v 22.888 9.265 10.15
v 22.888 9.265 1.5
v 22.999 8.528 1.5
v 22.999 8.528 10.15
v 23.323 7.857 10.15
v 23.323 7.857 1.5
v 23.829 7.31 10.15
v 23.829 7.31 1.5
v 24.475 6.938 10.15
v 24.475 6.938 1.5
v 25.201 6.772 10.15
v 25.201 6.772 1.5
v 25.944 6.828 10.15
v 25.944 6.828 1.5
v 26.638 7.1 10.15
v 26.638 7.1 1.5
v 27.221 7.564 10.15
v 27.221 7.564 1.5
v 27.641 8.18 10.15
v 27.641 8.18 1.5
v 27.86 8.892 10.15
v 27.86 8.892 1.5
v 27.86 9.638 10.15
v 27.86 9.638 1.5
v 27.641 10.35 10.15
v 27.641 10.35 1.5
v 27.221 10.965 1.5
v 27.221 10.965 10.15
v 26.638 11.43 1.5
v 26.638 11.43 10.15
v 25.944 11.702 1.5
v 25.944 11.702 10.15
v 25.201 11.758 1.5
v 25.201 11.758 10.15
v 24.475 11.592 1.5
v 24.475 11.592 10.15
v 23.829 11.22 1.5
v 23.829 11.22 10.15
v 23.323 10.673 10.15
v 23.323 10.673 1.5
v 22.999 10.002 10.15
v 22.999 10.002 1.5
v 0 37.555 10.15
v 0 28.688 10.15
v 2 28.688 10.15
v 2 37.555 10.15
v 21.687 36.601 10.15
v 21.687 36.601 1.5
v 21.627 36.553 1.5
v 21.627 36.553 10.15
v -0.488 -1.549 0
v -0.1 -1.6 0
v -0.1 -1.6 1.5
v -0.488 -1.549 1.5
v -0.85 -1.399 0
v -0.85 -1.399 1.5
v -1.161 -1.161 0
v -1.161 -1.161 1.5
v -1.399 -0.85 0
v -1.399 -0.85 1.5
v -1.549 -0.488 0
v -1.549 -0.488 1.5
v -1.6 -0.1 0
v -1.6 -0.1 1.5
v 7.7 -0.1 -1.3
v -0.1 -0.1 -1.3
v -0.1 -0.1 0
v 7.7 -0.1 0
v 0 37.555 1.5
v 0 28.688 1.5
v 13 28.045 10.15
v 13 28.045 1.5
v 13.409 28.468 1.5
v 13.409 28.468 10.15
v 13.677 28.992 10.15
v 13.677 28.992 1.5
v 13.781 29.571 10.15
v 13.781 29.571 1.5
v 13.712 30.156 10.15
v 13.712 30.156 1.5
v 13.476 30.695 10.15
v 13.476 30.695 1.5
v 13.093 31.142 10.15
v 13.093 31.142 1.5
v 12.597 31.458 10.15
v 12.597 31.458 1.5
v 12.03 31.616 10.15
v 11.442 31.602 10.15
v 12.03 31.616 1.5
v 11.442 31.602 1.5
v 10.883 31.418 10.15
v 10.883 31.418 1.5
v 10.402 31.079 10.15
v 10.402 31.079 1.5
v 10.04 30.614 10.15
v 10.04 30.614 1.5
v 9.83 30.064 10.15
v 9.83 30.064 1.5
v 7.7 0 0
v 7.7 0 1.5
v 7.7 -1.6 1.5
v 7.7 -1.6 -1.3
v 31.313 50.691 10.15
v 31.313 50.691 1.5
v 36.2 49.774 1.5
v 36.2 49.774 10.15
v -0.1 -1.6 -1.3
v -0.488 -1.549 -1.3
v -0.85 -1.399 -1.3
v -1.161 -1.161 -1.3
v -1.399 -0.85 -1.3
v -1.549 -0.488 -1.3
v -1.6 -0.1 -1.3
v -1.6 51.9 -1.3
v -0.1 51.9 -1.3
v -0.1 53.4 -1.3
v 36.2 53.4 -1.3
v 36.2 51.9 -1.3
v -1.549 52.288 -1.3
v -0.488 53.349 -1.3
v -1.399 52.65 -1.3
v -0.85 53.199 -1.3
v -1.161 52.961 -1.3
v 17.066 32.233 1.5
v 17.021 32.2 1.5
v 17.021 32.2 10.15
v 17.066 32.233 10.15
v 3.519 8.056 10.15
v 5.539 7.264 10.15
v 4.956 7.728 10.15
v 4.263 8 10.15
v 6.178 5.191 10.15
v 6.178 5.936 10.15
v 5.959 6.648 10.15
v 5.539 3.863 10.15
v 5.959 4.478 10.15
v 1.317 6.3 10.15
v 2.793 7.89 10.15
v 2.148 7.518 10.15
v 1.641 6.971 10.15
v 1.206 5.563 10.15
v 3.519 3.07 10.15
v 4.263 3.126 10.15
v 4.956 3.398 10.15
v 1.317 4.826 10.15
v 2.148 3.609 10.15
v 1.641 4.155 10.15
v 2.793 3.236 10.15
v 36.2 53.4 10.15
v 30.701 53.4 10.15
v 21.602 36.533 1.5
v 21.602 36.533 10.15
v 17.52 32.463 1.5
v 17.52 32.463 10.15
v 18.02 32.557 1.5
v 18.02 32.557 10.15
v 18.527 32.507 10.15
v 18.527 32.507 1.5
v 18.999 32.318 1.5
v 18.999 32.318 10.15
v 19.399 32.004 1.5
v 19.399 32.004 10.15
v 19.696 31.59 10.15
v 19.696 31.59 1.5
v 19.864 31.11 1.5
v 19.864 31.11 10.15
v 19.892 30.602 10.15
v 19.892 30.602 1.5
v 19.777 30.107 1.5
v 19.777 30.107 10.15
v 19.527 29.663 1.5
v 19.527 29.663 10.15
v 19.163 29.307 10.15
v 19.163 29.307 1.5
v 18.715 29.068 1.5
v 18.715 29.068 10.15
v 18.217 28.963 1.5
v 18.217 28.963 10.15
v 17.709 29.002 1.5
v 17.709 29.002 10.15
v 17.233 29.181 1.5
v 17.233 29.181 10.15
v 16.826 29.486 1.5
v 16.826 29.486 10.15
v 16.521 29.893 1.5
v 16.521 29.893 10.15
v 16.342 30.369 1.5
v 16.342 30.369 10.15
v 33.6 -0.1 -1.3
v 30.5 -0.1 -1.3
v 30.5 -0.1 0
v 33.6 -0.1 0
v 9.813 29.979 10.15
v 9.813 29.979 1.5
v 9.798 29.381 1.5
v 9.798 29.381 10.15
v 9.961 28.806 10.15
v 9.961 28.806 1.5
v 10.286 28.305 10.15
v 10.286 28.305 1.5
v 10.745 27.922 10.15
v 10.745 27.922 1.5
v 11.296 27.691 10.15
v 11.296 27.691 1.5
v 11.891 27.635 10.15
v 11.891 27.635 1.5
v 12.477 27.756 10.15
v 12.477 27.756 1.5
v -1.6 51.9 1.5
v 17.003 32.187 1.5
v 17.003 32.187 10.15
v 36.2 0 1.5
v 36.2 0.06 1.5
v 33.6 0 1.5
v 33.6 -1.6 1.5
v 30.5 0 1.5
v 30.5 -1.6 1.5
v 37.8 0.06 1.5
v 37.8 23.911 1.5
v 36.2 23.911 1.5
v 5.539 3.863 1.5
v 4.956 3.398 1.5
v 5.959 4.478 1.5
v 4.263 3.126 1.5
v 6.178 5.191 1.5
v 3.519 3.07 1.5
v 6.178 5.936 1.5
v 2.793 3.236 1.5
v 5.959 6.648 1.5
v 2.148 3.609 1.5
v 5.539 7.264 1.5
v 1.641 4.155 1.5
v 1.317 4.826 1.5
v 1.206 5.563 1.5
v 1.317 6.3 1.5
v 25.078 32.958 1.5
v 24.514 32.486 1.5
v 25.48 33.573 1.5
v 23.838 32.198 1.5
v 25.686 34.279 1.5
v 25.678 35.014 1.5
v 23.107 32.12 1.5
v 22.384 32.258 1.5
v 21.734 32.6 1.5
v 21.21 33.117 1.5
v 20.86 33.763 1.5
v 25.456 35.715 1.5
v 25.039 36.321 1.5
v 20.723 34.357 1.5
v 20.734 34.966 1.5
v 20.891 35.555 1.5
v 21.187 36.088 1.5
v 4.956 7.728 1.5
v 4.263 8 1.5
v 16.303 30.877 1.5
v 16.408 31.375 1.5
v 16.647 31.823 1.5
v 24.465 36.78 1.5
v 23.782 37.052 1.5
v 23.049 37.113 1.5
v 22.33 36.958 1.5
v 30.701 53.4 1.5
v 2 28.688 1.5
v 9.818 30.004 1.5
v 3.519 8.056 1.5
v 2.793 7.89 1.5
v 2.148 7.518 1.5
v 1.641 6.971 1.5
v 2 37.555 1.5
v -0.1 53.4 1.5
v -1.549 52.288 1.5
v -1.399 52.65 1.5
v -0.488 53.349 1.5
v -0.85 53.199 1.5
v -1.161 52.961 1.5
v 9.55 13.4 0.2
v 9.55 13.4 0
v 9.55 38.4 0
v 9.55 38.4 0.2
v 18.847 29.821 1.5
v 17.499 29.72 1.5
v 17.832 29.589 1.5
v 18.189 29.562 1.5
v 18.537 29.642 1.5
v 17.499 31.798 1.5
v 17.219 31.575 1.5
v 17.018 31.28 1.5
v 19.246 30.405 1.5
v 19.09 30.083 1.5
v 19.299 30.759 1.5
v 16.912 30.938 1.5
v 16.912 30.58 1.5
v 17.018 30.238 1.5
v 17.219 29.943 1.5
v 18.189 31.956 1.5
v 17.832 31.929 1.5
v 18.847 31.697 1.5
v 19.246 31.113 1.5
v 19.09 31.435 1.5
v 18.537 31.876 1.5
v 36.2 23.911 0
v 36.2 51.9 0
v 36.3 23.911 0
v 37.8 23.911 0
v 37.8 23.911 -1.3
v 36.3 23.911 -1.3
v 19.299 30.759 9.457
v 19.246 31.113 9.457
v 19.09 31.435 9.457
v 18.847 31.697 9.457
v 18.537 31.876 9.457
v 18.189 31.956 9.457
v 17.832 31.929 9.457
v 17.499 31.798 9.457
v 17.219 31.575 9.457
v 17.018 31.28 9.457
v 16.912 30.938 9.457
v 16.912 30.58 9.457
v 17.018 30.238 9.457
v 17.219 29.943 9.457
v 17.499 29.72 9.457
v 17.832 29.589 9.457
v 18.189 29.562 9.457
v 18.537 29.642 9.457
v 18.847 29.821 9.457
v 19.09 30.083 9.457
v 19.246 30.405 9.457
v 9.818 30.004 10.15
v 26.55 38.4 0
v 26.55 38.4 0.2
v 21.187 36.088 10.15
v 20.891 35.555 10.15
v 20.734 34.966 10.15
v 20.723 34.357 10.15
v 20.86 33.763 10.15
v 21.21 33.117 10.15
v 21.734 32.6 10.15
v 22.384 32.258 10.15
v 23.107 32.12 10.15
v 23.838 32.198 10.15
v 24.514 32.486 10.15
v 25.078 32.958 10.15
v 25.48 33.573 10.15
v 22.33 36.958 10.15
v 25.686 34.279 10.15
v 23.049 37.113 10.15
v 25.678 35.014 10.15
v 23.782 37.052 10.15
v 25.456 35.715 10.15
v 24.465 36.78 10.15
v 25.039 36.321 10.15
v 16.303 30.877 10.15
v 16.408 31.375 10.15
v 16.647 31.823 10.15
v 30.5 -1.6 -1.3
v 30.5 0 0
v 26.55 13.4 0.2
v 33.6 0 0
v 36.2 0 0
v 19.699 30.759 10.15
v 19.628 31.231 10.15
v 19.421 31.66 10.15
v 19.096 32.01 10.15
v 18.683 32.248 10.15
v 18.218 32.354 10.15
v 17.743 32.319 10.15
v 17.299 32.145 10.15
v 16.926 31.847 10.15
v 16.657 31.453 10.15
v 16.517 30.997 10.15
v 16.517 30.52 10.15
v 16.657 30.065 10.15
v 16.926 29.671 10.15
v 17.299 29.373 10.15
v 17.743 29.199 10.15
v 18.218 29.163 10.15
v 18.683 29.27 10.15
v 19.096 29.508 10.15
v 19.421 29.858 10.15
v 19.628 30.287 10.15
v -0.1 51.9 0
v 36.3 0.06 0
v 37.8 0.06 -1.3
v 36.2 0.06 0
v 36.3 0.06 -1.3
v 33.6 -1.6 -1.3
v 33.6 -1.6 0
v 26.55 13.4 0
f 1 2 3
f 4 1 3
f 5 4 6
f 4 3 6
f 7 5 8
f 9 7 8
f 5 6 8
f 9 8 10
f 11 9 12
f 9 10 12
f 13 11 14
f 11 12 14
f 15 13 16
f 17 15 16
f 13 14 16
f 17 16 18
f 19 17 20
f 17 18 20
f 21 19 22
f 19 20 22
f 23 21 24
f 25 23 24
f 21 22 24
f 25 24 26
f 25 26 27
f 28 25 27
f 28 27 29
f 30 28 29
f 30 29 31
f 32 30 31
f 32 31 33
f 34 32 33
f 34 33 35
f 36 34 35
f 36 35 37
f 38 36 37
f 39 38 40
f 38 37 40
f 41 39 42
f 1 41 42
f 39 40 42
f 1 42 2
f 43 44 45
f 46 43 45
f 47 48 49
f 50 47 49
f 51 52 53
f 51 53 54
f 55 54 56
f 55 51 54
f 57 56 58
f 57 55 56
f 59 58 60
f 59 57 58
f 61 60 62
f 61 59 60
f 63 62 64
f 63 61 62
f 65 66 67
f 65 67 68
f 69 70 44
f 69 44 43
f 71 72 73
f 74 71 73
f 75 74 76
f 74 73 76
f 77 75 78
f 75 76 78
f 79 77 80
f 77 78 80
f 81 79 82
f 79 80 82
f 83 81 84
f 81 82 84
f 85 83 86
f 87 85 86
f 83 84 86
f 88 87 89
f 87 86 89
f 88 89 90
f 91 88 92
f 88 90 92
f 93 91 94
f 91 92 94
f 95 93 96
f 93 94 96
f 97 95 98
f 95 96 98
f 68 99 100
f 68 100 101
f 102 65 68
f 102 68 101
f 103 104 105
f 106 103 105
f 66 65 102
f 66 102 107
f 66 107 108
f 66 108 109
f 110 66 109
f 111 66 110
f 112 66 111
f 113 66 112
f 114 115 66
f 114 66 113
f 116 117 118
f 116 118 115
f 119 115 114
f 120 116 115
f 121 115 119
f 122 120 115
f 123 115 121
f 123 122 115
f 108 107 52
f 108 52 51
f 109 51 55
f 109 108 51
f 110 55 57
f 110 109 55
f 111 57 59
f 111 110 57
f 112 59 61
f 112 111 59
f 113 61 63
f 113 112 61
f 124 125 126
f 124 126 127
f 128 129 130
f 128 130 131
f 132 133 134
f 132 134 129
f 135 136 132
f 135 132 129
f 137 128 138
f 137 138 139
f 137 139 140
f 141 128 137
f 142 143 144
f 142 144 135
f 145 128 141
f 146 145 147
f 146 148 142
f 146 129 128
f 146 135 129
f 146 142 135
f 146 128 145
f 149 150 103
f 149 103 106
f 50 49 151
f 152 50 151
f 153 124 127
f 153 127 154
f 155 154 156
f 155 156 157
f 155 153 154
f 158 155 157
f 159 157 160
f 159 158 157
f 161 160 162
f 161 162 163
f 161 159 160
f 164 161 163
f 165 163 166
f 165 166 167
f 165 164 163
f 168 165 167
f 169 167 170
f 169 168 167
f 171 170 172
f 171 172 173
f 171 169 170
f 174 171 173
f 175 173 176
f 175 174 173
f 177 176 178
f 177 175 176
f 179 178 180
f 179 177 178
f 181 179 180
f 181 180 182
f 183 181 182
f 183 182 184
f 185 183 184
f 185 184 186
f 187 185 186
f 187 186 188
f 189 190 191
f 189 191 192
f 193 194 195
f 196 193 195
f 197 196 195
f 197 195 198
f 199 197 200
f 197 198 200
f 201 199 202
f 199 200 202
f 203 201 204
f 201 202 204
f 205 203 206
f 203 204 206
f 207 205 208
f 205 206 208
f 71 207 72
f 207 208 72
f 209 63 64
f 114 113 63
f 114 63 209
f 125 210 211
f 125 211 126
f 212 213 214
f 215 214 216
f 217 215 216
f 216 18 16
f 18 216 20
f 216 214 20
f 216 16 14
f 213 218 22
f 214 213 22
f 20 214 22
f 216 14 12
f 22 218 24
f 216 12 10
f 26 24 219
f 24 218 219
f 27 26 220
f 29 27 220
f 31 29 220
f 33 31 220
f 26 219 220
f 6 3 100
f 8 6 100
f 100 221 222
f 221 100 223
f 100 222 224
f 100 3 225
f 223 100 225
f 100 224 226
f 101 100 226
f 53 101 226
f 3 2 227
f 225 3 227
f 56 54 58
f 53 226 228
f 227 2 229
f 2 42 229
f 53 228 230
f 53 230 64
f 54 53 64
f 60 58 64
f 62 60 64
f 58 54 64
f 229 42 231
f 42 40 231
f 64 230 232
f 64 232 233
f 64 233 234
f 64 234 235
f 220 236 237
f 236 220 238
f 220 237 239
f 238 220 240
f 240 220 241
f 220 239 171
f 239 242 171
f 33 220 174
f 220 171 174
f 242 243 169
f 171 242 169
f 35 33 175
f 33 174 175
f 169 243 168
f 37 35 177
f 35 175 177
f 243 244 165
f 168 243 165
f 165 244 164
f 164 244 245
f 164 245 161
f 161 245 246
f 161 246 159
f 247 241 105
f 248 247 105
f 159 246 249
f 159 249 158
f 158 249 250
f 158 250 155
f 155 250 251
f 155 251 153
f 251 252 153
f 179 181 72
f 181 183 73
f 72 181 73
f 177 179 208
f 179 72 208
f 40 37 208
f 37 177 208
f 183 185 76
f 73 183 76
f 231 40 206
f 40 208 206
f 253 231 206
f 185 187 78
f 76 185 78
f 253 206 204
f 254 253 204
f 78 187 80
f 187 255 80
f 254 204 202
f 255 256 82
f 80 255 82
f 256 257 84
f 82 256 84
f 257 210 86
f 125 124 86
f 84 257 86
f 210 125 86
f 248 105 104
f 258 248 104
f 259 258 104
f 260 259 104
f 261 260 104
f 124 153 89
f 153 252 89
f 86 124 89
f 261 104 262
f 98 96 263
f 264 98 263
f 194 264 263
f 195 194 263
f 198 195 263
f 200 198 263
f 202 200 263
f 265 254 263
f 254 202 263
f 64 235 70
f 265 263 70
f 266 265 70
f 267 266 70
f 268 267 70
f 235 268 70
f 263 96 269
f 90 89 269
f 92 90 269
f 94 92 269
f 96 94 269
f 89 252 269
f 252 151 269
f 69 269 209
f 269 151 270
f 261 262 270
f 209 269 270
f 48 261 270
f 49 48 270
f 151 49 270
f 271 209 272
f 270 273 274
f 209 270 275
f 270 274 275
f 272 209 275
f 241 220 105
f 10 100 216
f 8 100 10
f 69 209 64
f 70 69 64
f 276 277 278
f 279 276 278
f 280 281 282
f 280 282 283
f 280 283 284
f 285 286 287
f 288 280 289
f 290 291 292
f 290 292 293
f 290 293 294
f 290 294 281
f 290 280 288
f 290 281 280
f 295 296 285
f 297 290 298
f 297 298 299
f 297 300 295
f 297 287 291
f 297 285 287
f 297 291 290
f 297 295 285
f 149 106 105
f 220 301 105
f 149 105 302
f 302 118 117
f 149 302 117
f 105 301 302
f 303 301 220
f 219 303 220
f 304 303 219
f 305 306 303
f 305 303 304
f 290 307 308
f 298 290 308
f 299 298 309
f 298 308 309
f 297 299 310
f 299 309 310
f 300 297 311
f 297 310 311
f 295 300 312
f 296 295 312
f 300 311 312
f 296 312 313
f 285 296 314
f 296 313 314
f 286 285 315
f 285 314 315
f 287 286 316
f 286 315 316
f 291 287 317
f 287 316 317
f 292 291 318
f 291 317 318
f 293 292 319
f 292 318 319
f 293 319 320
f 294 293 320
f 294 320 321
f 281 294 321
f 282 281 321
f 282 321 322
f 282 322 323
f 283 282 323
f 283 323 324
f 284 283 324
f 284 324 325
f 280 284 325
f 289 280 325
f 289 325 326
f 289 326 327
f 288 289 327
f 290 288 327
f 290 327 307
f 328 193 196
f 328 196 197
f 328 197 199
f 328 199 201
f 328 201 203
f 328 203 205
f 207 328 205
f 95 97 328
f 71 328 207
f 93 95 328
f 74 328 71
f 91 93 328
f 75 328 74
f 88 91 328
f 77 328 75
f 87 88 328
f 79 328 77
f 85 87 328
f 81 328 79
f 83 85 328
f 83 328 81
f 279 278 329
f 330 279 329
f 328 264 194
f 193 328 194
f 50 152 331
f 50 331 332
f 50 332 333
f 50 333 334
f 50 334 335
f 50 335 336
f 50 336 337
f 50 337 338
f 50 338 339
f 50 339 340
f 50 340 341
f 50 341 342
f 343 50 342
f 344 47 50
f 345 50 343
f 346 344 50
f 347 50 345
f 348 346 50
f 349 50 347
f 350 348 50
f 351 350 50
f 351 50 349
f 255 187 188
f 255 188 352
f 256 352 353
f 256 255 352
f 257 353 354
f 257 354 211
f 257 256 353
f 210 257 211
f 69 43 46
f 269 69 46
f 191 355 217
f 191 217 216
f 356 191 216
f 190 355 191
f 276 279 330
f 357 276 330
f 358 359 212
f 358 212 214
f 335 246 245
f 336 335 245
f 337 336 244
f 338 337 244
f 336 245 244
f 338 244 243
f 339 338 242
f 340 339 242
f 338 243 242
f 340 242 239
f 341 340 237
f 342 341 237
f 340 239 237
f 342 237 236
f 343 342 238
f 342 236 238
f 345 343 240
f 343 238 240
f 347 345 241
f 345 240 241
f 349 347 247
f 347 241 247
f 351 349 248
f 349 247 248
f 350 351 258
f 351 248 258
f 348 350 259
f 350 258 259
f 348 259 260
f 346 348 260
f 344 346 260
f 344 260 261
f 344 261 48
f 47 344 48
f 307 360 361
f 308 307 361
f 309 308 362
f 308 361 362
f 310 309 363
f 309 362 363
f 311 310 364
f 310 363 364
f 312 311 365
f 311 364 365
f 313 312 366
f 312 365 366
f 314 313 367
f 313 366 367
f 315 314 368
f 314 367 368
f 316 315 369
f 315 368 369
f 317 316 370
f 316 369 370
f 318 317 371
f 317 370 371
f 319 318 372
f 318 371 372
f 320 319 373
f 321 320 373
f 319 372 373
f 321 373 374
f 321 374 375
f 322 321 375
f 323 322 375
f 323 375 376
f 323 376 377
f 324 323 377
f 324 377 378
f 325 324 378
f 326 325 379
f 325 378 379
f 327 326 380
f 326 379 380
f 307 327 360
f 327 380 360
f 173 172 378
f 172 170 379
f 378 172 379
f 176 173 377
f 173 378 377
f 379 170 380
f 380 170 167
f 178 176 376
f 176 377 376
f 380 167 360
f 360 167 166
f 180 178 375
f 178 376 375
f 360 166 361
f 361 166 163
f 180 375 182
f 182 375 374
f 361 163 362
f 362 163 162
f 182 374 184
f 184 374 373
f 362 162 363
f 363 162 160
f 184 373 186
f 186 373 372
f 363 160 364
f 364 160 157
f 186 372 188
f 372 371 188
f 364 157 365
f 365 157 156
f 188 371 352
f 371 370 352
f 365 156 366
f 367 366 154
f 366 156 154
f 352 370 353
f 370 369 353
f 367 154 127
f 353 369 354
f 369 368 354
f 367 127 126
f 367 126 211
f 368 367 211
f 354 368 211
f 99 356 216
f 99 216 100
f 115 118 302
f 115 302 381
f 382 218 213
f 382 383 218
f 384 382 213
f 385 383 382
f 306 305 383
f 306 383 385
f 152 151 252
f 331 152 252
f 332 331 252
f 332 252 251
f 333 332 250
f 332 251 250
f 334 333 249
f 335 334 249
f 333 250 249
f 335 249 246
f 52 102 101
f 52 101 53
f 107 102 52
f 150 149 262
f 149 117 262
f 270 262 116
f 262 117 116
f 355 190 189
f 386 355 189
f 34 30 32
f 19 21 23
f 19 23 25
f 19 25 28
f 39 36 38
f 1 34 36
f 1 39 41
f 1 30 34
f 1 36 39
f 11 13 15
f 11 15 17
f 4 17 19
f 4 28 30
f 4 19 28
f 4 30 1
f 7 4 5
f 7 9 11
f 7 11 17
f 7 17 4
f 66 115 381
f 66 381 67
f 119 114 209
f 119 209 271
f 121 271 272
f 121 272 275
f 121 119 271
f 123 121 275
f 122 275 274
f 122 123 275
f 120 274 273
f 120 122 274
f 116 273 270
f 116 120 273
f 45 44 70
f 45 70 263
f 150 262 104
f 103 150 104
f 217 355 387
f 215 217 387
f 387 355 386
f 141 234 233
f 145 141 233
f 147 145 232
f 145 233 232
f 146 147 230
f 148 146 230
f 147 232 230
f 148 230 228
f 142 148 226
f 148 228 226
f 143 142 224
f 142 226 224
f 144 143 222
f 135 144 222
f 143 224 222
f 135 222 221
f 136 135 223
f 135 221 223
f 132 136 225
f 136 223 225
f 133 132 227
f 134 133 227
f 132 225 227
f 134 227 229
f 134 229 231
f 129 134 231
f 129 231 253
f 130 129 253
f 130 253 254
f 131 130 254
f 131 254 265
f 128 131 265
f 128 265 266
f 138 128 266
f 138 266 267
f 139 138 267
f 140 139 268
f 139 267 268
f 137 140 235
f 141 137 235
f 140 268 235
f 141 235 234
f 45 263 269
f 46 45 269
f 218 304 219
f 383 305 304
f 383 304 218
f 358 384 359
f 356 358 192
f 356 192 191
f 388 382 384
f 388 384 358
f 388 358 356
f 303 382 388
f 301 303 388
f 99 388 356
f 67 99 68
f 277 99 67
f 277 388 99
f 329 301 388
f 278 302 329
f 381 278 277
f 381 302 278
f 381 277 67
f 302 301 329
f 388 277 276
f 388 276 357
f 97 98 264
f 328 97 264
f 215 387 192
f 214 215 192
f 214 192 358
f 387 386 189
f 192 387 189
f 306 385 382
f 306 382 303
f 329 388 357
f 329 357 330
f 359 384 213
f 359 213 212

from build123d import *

# Parameters (mm, degrees)
DISPLAY_SUPPORT_PLATE_DEPTH           = 1.5
UNDERSIDE_LOCATING_RIM_START          = -1.3
UNDERSIDE_LOCATING_RIM_PROFILE_W      = 3.099998474
UNDERSIDE_LOCATING_RIM_PROFILE_H      = 1.499999911
UNDERSIDE_LOCATING_RIM_DEPTH          = 1.3
DISPLAY_RELIEF_PROFILE_W              = 17
DISPLAY_RELIEF_PROFILE_H              = 25
DISPLAY_RELIEF_DEPTH                  = 0.2
POSTS_AND_RETAINING_STOPS_PROFILE_R   = 2.500000022
POSTS_AND_RETAINING_STOPS_PROFILE_R_2 = 2.500000099
POSTS_AND_RETAINING_STOPS_PROFILE_W   = 2
POSTS_AND_RETAINING_STOPS_PROFILE_H   = 8.867599487
POSTS_AND_RETAINING_STOPS_DEPTH       = 8.65
LOCATING_POST_BORE_PROFILE_R          = 1.2
LOCATING_POST_BORE_DEPTH              = 8.65
BORE_ENTRY_CHAMFER_PROFILE_R          = 1.6
BORE_ENTRY_CHAMFER_DEPTH              = 0.692820323
BORE_ENTRY_CHAMFER_DRAFT              = -30


with BuildPart() as part:
    # Display_support_plate_profile → Display_support_plate (new body)
    with BuildSketch(Plane.XY):
        with BuildLine():
            Line((-0.099999994, 53.399997711), (36.200000763, 53.399997711))
            Line((36.200000763, 53.399997711), (36.200000763, 23.911094666))
            Line((36.200000763, 23.911094666), (37.799999237, 23.911094666))
            Line((37.799999237, 23.911094666), (37.799999237, 0.059999999))
            Line((37.799999237, 0.059999999), (36.200000763, 0.059999999))
            Line((36.200000763, 0.059999999), (36.200000763, 0))
            Line((36.200000763, 0), (33.599998474, 0))
            Line((33.599998474, 0), (33.599998474, -1.599999905))
            Line((33.599998474, -1.599999905), (30.5, -1.599999905))
            Line((30.5, -1.599999905), (30.5, 0))
            Line((30.5, 0), (7.699999809, 0))
            Line((7.699999809, 0), (7.699999809, -1.599999905))
            Line((7.699999809, -1.599999905), (-0.099999994, -1.599999905))
            ThreePointArc((-0.099999994, -1.599999905), (-1.160660136, -1.160660136), (-1.599999905, -0.099999994))
            Line((-1.599999905, -0.099999994), (-1.599999905, 51.899997711))
            ThreePointArc((-1.599999905, 51.899997711), (-1.160660627, 52.960658371), (-0.099999994, 53.399997711))
        make_face()
    extrude(amount=DISPLAY_SUPPORT_PLATE_DEPTH)

    # Underside_locating_rim_profile → Underside_locating_rim (add)
    with BuildSketch(Plane.XY.offset(UNDERSIDE_LOCATING_RIM_START)):
        with Locations((32.049999237, -0.84999995)):
            Rectangle(UNDERSIDE_LOCATING_RIM_PROFILE_W, UNDERSIDE_LOCATING_RIM_PROFILE_H)
        with BuildLine():
            Line((-0.099999994, -0.099999994), (7.699999809, -0.099999994))
            Line((7.699999809, -0.099999994), (7.699999809, -1.599999905))
            Line((7.699999809, -1.599999905), (-0.099999994, -1.599999905))
            ThreePointArc((-0.099999994, -1.599999905), (-1.160660103, -1.160660103), (-1.599999905, -0.099999994))
            Line((-1.599999905, -0.099999994), (-1.599999905, 4.496020254))
            Line((-1.599999905, 4.496020254), (-1.599999905, 51.899997711))
            ThreePointArc((-1.599999905, 51.899997711), (-1.160660627, 52.960658371), (-0.099999994, 53.399997711))
            Line((-0.099999994, 53.399997711), (36.200000763, 53.399997711))
            Line((36.200000763, 53.399997711), (36.200000763, 51.899997711))
            Line((36.200000763, 51.899997711), (-0.100001678, 51.899999485))
            Line((-0.100001678, 51.899999485), (-0.099999994, -0.099999994))
        make_face()
        Polygon((36.299999237, 23.911094665), (37.799999237, 23.911094665), (37.799999237, 22.93311111), (37.799999237, 0.059999999), (36.299999237, 0.059999999), align=None)
    extrude(amount=UNDERSIDE_LOCATING_RIM_DEPTH)

    # Display_relief_profile → Display_relief (cut)
    with BuildSketch(Plane.XY):
        with Locations((18.05, 25.9)):
            Rectangle(DISPLAY_RELIEF_PROFILE_W, DISPLAY_RELIEF_PROFILE_H)
    extrude(amount=DISPLAY_RELIEF_DEPTH, mode=Mode.SUBTRACT)

    # Posts_and_retaining_stops_profile → Posts_and_retaining_stops (add)
    with BuildSketch(Plane.XY.offset(1.5)):
        with Locations(Location((3.706309939, 5.563148769, 0), (0, 0, 180))):
            Circle(POSTS_AND_RETAINING_STOPS_PROFILE_R)
        with Locations(Location((25.3881588, 9.264928353, 0), (0, 0, 180))):
            Circle(POSTS_AND_RETAINING_STOPS_PROFILE_R_2)
        with Locations((1, 33.121494294)):
            Rectangle(POSTS_AND_RETAINING_STOPS_PROFILE_W, POSTS_AND_RETAINING_STOPS_PROFILE_H)
        with BuildLine():
            Line((21.687360763, 36.601463318), (21.626880424, 36.552923367))
            Line((21.626880424, 36.552923367), (21.602294922, 36.533191681))
            ThreePointArc((21.602294922, 36.533191681), (20.794438476, 35.265124808), (20.860019559, 33.763018036))
            ThreePointArc((20.860019559, 33.763018036), (25.609375503, 33.918488596), (21.687360763, 36.601463318))
        make_face()
        with BuildLine():
            Line((17.003135681, 32.186939239), (17.021439612, 32.20036124))
            Line((17.021439612, 32.20036124), (17.066467285, 32.233379364))
            ThreePointArc((17.066467285, 32.233379364), (19.77657842, 30.106586026), (16.341625109, 30.369355924))
            ThreePointArc((16.341625109, 30.369355924), (16.40750088, 31.374550646), (17.003135681, 32.186939239))
        make_face()
        with BuildLine():
            Line((9.829716682, 30.064435959), (9.817612885, 30.003588118))
            Line((9.817612885, 30.003588118), (9.812692642, 29.978853226))
            ThreePointArc((9.812692642, 29.978853226), (10.74475441, 27.921723152), (12.999830034, 28.044837762))
            ThreePointArc((12.999830034, 28.044837762), (12.856910571, 31.318323984), (9.829716682, 30.064435959))
        make_face()
        Polygon((36.200000763, 49.774204254), (36.200000763, 53.399997711), (32.290077446, 53.399997711), (30.700677872, 53.399997711), (31.313196182, 50.690540314), align=None)
    extrude(amount=POSTS_AND_RETAINING_STOPS_DEPTH)

    # Locating_post_bore_profile → Locating_post_bore (cut)
    with BuildSketch(Plane.XY.offset(10.15)):
        with Locations((18.098906, 30.758906)):
            Circle(LOCATING_POST_BORE_PROFILE_R)
    extrude(amount=-LOCATING_POST_BORE_DEPTH, mode=Mode.SUBTRACT)


with BuildPart() as bore_entry_chamfer_tool:
    # Bore_entry_chamfer_profile → Bore_entry_chamfer (with draft: the straight prism first)
    with BuildSketch(Plane.XY.offset(10.15)):
        with Locations((18.098906, 30.758906)):
            Circle(BORE_ENTRY_CHAMFER_PROFILE_R)
    extrude(amount=-BORE_ENTRY_CHAMFER_DEPTH)
    # Bore_entry_chamfer: the draft: its side faces are tilted about the plane it starts from
    bore_entry_chamfer_sides = [bore_entry_chamfer_tool.faces().sort_by_distance(p)[0] for p in [
        (16.498906, 30.758906, 9.803589838),
    ]]
    draft(bore_entry_chamfer_sides, Plane.XY.offset(10.15), BORE_ENTRY_CHAMFER_DRAFT)


with BuildPart() as part_1:
    add(part.part)

    # Bore_entry_chamfer: cut by bore_entry_chamfer_tool
    add(bore_entry_chamfer_tool.part, mode=Mode.SUBTRACT)


solid = part_1.part
